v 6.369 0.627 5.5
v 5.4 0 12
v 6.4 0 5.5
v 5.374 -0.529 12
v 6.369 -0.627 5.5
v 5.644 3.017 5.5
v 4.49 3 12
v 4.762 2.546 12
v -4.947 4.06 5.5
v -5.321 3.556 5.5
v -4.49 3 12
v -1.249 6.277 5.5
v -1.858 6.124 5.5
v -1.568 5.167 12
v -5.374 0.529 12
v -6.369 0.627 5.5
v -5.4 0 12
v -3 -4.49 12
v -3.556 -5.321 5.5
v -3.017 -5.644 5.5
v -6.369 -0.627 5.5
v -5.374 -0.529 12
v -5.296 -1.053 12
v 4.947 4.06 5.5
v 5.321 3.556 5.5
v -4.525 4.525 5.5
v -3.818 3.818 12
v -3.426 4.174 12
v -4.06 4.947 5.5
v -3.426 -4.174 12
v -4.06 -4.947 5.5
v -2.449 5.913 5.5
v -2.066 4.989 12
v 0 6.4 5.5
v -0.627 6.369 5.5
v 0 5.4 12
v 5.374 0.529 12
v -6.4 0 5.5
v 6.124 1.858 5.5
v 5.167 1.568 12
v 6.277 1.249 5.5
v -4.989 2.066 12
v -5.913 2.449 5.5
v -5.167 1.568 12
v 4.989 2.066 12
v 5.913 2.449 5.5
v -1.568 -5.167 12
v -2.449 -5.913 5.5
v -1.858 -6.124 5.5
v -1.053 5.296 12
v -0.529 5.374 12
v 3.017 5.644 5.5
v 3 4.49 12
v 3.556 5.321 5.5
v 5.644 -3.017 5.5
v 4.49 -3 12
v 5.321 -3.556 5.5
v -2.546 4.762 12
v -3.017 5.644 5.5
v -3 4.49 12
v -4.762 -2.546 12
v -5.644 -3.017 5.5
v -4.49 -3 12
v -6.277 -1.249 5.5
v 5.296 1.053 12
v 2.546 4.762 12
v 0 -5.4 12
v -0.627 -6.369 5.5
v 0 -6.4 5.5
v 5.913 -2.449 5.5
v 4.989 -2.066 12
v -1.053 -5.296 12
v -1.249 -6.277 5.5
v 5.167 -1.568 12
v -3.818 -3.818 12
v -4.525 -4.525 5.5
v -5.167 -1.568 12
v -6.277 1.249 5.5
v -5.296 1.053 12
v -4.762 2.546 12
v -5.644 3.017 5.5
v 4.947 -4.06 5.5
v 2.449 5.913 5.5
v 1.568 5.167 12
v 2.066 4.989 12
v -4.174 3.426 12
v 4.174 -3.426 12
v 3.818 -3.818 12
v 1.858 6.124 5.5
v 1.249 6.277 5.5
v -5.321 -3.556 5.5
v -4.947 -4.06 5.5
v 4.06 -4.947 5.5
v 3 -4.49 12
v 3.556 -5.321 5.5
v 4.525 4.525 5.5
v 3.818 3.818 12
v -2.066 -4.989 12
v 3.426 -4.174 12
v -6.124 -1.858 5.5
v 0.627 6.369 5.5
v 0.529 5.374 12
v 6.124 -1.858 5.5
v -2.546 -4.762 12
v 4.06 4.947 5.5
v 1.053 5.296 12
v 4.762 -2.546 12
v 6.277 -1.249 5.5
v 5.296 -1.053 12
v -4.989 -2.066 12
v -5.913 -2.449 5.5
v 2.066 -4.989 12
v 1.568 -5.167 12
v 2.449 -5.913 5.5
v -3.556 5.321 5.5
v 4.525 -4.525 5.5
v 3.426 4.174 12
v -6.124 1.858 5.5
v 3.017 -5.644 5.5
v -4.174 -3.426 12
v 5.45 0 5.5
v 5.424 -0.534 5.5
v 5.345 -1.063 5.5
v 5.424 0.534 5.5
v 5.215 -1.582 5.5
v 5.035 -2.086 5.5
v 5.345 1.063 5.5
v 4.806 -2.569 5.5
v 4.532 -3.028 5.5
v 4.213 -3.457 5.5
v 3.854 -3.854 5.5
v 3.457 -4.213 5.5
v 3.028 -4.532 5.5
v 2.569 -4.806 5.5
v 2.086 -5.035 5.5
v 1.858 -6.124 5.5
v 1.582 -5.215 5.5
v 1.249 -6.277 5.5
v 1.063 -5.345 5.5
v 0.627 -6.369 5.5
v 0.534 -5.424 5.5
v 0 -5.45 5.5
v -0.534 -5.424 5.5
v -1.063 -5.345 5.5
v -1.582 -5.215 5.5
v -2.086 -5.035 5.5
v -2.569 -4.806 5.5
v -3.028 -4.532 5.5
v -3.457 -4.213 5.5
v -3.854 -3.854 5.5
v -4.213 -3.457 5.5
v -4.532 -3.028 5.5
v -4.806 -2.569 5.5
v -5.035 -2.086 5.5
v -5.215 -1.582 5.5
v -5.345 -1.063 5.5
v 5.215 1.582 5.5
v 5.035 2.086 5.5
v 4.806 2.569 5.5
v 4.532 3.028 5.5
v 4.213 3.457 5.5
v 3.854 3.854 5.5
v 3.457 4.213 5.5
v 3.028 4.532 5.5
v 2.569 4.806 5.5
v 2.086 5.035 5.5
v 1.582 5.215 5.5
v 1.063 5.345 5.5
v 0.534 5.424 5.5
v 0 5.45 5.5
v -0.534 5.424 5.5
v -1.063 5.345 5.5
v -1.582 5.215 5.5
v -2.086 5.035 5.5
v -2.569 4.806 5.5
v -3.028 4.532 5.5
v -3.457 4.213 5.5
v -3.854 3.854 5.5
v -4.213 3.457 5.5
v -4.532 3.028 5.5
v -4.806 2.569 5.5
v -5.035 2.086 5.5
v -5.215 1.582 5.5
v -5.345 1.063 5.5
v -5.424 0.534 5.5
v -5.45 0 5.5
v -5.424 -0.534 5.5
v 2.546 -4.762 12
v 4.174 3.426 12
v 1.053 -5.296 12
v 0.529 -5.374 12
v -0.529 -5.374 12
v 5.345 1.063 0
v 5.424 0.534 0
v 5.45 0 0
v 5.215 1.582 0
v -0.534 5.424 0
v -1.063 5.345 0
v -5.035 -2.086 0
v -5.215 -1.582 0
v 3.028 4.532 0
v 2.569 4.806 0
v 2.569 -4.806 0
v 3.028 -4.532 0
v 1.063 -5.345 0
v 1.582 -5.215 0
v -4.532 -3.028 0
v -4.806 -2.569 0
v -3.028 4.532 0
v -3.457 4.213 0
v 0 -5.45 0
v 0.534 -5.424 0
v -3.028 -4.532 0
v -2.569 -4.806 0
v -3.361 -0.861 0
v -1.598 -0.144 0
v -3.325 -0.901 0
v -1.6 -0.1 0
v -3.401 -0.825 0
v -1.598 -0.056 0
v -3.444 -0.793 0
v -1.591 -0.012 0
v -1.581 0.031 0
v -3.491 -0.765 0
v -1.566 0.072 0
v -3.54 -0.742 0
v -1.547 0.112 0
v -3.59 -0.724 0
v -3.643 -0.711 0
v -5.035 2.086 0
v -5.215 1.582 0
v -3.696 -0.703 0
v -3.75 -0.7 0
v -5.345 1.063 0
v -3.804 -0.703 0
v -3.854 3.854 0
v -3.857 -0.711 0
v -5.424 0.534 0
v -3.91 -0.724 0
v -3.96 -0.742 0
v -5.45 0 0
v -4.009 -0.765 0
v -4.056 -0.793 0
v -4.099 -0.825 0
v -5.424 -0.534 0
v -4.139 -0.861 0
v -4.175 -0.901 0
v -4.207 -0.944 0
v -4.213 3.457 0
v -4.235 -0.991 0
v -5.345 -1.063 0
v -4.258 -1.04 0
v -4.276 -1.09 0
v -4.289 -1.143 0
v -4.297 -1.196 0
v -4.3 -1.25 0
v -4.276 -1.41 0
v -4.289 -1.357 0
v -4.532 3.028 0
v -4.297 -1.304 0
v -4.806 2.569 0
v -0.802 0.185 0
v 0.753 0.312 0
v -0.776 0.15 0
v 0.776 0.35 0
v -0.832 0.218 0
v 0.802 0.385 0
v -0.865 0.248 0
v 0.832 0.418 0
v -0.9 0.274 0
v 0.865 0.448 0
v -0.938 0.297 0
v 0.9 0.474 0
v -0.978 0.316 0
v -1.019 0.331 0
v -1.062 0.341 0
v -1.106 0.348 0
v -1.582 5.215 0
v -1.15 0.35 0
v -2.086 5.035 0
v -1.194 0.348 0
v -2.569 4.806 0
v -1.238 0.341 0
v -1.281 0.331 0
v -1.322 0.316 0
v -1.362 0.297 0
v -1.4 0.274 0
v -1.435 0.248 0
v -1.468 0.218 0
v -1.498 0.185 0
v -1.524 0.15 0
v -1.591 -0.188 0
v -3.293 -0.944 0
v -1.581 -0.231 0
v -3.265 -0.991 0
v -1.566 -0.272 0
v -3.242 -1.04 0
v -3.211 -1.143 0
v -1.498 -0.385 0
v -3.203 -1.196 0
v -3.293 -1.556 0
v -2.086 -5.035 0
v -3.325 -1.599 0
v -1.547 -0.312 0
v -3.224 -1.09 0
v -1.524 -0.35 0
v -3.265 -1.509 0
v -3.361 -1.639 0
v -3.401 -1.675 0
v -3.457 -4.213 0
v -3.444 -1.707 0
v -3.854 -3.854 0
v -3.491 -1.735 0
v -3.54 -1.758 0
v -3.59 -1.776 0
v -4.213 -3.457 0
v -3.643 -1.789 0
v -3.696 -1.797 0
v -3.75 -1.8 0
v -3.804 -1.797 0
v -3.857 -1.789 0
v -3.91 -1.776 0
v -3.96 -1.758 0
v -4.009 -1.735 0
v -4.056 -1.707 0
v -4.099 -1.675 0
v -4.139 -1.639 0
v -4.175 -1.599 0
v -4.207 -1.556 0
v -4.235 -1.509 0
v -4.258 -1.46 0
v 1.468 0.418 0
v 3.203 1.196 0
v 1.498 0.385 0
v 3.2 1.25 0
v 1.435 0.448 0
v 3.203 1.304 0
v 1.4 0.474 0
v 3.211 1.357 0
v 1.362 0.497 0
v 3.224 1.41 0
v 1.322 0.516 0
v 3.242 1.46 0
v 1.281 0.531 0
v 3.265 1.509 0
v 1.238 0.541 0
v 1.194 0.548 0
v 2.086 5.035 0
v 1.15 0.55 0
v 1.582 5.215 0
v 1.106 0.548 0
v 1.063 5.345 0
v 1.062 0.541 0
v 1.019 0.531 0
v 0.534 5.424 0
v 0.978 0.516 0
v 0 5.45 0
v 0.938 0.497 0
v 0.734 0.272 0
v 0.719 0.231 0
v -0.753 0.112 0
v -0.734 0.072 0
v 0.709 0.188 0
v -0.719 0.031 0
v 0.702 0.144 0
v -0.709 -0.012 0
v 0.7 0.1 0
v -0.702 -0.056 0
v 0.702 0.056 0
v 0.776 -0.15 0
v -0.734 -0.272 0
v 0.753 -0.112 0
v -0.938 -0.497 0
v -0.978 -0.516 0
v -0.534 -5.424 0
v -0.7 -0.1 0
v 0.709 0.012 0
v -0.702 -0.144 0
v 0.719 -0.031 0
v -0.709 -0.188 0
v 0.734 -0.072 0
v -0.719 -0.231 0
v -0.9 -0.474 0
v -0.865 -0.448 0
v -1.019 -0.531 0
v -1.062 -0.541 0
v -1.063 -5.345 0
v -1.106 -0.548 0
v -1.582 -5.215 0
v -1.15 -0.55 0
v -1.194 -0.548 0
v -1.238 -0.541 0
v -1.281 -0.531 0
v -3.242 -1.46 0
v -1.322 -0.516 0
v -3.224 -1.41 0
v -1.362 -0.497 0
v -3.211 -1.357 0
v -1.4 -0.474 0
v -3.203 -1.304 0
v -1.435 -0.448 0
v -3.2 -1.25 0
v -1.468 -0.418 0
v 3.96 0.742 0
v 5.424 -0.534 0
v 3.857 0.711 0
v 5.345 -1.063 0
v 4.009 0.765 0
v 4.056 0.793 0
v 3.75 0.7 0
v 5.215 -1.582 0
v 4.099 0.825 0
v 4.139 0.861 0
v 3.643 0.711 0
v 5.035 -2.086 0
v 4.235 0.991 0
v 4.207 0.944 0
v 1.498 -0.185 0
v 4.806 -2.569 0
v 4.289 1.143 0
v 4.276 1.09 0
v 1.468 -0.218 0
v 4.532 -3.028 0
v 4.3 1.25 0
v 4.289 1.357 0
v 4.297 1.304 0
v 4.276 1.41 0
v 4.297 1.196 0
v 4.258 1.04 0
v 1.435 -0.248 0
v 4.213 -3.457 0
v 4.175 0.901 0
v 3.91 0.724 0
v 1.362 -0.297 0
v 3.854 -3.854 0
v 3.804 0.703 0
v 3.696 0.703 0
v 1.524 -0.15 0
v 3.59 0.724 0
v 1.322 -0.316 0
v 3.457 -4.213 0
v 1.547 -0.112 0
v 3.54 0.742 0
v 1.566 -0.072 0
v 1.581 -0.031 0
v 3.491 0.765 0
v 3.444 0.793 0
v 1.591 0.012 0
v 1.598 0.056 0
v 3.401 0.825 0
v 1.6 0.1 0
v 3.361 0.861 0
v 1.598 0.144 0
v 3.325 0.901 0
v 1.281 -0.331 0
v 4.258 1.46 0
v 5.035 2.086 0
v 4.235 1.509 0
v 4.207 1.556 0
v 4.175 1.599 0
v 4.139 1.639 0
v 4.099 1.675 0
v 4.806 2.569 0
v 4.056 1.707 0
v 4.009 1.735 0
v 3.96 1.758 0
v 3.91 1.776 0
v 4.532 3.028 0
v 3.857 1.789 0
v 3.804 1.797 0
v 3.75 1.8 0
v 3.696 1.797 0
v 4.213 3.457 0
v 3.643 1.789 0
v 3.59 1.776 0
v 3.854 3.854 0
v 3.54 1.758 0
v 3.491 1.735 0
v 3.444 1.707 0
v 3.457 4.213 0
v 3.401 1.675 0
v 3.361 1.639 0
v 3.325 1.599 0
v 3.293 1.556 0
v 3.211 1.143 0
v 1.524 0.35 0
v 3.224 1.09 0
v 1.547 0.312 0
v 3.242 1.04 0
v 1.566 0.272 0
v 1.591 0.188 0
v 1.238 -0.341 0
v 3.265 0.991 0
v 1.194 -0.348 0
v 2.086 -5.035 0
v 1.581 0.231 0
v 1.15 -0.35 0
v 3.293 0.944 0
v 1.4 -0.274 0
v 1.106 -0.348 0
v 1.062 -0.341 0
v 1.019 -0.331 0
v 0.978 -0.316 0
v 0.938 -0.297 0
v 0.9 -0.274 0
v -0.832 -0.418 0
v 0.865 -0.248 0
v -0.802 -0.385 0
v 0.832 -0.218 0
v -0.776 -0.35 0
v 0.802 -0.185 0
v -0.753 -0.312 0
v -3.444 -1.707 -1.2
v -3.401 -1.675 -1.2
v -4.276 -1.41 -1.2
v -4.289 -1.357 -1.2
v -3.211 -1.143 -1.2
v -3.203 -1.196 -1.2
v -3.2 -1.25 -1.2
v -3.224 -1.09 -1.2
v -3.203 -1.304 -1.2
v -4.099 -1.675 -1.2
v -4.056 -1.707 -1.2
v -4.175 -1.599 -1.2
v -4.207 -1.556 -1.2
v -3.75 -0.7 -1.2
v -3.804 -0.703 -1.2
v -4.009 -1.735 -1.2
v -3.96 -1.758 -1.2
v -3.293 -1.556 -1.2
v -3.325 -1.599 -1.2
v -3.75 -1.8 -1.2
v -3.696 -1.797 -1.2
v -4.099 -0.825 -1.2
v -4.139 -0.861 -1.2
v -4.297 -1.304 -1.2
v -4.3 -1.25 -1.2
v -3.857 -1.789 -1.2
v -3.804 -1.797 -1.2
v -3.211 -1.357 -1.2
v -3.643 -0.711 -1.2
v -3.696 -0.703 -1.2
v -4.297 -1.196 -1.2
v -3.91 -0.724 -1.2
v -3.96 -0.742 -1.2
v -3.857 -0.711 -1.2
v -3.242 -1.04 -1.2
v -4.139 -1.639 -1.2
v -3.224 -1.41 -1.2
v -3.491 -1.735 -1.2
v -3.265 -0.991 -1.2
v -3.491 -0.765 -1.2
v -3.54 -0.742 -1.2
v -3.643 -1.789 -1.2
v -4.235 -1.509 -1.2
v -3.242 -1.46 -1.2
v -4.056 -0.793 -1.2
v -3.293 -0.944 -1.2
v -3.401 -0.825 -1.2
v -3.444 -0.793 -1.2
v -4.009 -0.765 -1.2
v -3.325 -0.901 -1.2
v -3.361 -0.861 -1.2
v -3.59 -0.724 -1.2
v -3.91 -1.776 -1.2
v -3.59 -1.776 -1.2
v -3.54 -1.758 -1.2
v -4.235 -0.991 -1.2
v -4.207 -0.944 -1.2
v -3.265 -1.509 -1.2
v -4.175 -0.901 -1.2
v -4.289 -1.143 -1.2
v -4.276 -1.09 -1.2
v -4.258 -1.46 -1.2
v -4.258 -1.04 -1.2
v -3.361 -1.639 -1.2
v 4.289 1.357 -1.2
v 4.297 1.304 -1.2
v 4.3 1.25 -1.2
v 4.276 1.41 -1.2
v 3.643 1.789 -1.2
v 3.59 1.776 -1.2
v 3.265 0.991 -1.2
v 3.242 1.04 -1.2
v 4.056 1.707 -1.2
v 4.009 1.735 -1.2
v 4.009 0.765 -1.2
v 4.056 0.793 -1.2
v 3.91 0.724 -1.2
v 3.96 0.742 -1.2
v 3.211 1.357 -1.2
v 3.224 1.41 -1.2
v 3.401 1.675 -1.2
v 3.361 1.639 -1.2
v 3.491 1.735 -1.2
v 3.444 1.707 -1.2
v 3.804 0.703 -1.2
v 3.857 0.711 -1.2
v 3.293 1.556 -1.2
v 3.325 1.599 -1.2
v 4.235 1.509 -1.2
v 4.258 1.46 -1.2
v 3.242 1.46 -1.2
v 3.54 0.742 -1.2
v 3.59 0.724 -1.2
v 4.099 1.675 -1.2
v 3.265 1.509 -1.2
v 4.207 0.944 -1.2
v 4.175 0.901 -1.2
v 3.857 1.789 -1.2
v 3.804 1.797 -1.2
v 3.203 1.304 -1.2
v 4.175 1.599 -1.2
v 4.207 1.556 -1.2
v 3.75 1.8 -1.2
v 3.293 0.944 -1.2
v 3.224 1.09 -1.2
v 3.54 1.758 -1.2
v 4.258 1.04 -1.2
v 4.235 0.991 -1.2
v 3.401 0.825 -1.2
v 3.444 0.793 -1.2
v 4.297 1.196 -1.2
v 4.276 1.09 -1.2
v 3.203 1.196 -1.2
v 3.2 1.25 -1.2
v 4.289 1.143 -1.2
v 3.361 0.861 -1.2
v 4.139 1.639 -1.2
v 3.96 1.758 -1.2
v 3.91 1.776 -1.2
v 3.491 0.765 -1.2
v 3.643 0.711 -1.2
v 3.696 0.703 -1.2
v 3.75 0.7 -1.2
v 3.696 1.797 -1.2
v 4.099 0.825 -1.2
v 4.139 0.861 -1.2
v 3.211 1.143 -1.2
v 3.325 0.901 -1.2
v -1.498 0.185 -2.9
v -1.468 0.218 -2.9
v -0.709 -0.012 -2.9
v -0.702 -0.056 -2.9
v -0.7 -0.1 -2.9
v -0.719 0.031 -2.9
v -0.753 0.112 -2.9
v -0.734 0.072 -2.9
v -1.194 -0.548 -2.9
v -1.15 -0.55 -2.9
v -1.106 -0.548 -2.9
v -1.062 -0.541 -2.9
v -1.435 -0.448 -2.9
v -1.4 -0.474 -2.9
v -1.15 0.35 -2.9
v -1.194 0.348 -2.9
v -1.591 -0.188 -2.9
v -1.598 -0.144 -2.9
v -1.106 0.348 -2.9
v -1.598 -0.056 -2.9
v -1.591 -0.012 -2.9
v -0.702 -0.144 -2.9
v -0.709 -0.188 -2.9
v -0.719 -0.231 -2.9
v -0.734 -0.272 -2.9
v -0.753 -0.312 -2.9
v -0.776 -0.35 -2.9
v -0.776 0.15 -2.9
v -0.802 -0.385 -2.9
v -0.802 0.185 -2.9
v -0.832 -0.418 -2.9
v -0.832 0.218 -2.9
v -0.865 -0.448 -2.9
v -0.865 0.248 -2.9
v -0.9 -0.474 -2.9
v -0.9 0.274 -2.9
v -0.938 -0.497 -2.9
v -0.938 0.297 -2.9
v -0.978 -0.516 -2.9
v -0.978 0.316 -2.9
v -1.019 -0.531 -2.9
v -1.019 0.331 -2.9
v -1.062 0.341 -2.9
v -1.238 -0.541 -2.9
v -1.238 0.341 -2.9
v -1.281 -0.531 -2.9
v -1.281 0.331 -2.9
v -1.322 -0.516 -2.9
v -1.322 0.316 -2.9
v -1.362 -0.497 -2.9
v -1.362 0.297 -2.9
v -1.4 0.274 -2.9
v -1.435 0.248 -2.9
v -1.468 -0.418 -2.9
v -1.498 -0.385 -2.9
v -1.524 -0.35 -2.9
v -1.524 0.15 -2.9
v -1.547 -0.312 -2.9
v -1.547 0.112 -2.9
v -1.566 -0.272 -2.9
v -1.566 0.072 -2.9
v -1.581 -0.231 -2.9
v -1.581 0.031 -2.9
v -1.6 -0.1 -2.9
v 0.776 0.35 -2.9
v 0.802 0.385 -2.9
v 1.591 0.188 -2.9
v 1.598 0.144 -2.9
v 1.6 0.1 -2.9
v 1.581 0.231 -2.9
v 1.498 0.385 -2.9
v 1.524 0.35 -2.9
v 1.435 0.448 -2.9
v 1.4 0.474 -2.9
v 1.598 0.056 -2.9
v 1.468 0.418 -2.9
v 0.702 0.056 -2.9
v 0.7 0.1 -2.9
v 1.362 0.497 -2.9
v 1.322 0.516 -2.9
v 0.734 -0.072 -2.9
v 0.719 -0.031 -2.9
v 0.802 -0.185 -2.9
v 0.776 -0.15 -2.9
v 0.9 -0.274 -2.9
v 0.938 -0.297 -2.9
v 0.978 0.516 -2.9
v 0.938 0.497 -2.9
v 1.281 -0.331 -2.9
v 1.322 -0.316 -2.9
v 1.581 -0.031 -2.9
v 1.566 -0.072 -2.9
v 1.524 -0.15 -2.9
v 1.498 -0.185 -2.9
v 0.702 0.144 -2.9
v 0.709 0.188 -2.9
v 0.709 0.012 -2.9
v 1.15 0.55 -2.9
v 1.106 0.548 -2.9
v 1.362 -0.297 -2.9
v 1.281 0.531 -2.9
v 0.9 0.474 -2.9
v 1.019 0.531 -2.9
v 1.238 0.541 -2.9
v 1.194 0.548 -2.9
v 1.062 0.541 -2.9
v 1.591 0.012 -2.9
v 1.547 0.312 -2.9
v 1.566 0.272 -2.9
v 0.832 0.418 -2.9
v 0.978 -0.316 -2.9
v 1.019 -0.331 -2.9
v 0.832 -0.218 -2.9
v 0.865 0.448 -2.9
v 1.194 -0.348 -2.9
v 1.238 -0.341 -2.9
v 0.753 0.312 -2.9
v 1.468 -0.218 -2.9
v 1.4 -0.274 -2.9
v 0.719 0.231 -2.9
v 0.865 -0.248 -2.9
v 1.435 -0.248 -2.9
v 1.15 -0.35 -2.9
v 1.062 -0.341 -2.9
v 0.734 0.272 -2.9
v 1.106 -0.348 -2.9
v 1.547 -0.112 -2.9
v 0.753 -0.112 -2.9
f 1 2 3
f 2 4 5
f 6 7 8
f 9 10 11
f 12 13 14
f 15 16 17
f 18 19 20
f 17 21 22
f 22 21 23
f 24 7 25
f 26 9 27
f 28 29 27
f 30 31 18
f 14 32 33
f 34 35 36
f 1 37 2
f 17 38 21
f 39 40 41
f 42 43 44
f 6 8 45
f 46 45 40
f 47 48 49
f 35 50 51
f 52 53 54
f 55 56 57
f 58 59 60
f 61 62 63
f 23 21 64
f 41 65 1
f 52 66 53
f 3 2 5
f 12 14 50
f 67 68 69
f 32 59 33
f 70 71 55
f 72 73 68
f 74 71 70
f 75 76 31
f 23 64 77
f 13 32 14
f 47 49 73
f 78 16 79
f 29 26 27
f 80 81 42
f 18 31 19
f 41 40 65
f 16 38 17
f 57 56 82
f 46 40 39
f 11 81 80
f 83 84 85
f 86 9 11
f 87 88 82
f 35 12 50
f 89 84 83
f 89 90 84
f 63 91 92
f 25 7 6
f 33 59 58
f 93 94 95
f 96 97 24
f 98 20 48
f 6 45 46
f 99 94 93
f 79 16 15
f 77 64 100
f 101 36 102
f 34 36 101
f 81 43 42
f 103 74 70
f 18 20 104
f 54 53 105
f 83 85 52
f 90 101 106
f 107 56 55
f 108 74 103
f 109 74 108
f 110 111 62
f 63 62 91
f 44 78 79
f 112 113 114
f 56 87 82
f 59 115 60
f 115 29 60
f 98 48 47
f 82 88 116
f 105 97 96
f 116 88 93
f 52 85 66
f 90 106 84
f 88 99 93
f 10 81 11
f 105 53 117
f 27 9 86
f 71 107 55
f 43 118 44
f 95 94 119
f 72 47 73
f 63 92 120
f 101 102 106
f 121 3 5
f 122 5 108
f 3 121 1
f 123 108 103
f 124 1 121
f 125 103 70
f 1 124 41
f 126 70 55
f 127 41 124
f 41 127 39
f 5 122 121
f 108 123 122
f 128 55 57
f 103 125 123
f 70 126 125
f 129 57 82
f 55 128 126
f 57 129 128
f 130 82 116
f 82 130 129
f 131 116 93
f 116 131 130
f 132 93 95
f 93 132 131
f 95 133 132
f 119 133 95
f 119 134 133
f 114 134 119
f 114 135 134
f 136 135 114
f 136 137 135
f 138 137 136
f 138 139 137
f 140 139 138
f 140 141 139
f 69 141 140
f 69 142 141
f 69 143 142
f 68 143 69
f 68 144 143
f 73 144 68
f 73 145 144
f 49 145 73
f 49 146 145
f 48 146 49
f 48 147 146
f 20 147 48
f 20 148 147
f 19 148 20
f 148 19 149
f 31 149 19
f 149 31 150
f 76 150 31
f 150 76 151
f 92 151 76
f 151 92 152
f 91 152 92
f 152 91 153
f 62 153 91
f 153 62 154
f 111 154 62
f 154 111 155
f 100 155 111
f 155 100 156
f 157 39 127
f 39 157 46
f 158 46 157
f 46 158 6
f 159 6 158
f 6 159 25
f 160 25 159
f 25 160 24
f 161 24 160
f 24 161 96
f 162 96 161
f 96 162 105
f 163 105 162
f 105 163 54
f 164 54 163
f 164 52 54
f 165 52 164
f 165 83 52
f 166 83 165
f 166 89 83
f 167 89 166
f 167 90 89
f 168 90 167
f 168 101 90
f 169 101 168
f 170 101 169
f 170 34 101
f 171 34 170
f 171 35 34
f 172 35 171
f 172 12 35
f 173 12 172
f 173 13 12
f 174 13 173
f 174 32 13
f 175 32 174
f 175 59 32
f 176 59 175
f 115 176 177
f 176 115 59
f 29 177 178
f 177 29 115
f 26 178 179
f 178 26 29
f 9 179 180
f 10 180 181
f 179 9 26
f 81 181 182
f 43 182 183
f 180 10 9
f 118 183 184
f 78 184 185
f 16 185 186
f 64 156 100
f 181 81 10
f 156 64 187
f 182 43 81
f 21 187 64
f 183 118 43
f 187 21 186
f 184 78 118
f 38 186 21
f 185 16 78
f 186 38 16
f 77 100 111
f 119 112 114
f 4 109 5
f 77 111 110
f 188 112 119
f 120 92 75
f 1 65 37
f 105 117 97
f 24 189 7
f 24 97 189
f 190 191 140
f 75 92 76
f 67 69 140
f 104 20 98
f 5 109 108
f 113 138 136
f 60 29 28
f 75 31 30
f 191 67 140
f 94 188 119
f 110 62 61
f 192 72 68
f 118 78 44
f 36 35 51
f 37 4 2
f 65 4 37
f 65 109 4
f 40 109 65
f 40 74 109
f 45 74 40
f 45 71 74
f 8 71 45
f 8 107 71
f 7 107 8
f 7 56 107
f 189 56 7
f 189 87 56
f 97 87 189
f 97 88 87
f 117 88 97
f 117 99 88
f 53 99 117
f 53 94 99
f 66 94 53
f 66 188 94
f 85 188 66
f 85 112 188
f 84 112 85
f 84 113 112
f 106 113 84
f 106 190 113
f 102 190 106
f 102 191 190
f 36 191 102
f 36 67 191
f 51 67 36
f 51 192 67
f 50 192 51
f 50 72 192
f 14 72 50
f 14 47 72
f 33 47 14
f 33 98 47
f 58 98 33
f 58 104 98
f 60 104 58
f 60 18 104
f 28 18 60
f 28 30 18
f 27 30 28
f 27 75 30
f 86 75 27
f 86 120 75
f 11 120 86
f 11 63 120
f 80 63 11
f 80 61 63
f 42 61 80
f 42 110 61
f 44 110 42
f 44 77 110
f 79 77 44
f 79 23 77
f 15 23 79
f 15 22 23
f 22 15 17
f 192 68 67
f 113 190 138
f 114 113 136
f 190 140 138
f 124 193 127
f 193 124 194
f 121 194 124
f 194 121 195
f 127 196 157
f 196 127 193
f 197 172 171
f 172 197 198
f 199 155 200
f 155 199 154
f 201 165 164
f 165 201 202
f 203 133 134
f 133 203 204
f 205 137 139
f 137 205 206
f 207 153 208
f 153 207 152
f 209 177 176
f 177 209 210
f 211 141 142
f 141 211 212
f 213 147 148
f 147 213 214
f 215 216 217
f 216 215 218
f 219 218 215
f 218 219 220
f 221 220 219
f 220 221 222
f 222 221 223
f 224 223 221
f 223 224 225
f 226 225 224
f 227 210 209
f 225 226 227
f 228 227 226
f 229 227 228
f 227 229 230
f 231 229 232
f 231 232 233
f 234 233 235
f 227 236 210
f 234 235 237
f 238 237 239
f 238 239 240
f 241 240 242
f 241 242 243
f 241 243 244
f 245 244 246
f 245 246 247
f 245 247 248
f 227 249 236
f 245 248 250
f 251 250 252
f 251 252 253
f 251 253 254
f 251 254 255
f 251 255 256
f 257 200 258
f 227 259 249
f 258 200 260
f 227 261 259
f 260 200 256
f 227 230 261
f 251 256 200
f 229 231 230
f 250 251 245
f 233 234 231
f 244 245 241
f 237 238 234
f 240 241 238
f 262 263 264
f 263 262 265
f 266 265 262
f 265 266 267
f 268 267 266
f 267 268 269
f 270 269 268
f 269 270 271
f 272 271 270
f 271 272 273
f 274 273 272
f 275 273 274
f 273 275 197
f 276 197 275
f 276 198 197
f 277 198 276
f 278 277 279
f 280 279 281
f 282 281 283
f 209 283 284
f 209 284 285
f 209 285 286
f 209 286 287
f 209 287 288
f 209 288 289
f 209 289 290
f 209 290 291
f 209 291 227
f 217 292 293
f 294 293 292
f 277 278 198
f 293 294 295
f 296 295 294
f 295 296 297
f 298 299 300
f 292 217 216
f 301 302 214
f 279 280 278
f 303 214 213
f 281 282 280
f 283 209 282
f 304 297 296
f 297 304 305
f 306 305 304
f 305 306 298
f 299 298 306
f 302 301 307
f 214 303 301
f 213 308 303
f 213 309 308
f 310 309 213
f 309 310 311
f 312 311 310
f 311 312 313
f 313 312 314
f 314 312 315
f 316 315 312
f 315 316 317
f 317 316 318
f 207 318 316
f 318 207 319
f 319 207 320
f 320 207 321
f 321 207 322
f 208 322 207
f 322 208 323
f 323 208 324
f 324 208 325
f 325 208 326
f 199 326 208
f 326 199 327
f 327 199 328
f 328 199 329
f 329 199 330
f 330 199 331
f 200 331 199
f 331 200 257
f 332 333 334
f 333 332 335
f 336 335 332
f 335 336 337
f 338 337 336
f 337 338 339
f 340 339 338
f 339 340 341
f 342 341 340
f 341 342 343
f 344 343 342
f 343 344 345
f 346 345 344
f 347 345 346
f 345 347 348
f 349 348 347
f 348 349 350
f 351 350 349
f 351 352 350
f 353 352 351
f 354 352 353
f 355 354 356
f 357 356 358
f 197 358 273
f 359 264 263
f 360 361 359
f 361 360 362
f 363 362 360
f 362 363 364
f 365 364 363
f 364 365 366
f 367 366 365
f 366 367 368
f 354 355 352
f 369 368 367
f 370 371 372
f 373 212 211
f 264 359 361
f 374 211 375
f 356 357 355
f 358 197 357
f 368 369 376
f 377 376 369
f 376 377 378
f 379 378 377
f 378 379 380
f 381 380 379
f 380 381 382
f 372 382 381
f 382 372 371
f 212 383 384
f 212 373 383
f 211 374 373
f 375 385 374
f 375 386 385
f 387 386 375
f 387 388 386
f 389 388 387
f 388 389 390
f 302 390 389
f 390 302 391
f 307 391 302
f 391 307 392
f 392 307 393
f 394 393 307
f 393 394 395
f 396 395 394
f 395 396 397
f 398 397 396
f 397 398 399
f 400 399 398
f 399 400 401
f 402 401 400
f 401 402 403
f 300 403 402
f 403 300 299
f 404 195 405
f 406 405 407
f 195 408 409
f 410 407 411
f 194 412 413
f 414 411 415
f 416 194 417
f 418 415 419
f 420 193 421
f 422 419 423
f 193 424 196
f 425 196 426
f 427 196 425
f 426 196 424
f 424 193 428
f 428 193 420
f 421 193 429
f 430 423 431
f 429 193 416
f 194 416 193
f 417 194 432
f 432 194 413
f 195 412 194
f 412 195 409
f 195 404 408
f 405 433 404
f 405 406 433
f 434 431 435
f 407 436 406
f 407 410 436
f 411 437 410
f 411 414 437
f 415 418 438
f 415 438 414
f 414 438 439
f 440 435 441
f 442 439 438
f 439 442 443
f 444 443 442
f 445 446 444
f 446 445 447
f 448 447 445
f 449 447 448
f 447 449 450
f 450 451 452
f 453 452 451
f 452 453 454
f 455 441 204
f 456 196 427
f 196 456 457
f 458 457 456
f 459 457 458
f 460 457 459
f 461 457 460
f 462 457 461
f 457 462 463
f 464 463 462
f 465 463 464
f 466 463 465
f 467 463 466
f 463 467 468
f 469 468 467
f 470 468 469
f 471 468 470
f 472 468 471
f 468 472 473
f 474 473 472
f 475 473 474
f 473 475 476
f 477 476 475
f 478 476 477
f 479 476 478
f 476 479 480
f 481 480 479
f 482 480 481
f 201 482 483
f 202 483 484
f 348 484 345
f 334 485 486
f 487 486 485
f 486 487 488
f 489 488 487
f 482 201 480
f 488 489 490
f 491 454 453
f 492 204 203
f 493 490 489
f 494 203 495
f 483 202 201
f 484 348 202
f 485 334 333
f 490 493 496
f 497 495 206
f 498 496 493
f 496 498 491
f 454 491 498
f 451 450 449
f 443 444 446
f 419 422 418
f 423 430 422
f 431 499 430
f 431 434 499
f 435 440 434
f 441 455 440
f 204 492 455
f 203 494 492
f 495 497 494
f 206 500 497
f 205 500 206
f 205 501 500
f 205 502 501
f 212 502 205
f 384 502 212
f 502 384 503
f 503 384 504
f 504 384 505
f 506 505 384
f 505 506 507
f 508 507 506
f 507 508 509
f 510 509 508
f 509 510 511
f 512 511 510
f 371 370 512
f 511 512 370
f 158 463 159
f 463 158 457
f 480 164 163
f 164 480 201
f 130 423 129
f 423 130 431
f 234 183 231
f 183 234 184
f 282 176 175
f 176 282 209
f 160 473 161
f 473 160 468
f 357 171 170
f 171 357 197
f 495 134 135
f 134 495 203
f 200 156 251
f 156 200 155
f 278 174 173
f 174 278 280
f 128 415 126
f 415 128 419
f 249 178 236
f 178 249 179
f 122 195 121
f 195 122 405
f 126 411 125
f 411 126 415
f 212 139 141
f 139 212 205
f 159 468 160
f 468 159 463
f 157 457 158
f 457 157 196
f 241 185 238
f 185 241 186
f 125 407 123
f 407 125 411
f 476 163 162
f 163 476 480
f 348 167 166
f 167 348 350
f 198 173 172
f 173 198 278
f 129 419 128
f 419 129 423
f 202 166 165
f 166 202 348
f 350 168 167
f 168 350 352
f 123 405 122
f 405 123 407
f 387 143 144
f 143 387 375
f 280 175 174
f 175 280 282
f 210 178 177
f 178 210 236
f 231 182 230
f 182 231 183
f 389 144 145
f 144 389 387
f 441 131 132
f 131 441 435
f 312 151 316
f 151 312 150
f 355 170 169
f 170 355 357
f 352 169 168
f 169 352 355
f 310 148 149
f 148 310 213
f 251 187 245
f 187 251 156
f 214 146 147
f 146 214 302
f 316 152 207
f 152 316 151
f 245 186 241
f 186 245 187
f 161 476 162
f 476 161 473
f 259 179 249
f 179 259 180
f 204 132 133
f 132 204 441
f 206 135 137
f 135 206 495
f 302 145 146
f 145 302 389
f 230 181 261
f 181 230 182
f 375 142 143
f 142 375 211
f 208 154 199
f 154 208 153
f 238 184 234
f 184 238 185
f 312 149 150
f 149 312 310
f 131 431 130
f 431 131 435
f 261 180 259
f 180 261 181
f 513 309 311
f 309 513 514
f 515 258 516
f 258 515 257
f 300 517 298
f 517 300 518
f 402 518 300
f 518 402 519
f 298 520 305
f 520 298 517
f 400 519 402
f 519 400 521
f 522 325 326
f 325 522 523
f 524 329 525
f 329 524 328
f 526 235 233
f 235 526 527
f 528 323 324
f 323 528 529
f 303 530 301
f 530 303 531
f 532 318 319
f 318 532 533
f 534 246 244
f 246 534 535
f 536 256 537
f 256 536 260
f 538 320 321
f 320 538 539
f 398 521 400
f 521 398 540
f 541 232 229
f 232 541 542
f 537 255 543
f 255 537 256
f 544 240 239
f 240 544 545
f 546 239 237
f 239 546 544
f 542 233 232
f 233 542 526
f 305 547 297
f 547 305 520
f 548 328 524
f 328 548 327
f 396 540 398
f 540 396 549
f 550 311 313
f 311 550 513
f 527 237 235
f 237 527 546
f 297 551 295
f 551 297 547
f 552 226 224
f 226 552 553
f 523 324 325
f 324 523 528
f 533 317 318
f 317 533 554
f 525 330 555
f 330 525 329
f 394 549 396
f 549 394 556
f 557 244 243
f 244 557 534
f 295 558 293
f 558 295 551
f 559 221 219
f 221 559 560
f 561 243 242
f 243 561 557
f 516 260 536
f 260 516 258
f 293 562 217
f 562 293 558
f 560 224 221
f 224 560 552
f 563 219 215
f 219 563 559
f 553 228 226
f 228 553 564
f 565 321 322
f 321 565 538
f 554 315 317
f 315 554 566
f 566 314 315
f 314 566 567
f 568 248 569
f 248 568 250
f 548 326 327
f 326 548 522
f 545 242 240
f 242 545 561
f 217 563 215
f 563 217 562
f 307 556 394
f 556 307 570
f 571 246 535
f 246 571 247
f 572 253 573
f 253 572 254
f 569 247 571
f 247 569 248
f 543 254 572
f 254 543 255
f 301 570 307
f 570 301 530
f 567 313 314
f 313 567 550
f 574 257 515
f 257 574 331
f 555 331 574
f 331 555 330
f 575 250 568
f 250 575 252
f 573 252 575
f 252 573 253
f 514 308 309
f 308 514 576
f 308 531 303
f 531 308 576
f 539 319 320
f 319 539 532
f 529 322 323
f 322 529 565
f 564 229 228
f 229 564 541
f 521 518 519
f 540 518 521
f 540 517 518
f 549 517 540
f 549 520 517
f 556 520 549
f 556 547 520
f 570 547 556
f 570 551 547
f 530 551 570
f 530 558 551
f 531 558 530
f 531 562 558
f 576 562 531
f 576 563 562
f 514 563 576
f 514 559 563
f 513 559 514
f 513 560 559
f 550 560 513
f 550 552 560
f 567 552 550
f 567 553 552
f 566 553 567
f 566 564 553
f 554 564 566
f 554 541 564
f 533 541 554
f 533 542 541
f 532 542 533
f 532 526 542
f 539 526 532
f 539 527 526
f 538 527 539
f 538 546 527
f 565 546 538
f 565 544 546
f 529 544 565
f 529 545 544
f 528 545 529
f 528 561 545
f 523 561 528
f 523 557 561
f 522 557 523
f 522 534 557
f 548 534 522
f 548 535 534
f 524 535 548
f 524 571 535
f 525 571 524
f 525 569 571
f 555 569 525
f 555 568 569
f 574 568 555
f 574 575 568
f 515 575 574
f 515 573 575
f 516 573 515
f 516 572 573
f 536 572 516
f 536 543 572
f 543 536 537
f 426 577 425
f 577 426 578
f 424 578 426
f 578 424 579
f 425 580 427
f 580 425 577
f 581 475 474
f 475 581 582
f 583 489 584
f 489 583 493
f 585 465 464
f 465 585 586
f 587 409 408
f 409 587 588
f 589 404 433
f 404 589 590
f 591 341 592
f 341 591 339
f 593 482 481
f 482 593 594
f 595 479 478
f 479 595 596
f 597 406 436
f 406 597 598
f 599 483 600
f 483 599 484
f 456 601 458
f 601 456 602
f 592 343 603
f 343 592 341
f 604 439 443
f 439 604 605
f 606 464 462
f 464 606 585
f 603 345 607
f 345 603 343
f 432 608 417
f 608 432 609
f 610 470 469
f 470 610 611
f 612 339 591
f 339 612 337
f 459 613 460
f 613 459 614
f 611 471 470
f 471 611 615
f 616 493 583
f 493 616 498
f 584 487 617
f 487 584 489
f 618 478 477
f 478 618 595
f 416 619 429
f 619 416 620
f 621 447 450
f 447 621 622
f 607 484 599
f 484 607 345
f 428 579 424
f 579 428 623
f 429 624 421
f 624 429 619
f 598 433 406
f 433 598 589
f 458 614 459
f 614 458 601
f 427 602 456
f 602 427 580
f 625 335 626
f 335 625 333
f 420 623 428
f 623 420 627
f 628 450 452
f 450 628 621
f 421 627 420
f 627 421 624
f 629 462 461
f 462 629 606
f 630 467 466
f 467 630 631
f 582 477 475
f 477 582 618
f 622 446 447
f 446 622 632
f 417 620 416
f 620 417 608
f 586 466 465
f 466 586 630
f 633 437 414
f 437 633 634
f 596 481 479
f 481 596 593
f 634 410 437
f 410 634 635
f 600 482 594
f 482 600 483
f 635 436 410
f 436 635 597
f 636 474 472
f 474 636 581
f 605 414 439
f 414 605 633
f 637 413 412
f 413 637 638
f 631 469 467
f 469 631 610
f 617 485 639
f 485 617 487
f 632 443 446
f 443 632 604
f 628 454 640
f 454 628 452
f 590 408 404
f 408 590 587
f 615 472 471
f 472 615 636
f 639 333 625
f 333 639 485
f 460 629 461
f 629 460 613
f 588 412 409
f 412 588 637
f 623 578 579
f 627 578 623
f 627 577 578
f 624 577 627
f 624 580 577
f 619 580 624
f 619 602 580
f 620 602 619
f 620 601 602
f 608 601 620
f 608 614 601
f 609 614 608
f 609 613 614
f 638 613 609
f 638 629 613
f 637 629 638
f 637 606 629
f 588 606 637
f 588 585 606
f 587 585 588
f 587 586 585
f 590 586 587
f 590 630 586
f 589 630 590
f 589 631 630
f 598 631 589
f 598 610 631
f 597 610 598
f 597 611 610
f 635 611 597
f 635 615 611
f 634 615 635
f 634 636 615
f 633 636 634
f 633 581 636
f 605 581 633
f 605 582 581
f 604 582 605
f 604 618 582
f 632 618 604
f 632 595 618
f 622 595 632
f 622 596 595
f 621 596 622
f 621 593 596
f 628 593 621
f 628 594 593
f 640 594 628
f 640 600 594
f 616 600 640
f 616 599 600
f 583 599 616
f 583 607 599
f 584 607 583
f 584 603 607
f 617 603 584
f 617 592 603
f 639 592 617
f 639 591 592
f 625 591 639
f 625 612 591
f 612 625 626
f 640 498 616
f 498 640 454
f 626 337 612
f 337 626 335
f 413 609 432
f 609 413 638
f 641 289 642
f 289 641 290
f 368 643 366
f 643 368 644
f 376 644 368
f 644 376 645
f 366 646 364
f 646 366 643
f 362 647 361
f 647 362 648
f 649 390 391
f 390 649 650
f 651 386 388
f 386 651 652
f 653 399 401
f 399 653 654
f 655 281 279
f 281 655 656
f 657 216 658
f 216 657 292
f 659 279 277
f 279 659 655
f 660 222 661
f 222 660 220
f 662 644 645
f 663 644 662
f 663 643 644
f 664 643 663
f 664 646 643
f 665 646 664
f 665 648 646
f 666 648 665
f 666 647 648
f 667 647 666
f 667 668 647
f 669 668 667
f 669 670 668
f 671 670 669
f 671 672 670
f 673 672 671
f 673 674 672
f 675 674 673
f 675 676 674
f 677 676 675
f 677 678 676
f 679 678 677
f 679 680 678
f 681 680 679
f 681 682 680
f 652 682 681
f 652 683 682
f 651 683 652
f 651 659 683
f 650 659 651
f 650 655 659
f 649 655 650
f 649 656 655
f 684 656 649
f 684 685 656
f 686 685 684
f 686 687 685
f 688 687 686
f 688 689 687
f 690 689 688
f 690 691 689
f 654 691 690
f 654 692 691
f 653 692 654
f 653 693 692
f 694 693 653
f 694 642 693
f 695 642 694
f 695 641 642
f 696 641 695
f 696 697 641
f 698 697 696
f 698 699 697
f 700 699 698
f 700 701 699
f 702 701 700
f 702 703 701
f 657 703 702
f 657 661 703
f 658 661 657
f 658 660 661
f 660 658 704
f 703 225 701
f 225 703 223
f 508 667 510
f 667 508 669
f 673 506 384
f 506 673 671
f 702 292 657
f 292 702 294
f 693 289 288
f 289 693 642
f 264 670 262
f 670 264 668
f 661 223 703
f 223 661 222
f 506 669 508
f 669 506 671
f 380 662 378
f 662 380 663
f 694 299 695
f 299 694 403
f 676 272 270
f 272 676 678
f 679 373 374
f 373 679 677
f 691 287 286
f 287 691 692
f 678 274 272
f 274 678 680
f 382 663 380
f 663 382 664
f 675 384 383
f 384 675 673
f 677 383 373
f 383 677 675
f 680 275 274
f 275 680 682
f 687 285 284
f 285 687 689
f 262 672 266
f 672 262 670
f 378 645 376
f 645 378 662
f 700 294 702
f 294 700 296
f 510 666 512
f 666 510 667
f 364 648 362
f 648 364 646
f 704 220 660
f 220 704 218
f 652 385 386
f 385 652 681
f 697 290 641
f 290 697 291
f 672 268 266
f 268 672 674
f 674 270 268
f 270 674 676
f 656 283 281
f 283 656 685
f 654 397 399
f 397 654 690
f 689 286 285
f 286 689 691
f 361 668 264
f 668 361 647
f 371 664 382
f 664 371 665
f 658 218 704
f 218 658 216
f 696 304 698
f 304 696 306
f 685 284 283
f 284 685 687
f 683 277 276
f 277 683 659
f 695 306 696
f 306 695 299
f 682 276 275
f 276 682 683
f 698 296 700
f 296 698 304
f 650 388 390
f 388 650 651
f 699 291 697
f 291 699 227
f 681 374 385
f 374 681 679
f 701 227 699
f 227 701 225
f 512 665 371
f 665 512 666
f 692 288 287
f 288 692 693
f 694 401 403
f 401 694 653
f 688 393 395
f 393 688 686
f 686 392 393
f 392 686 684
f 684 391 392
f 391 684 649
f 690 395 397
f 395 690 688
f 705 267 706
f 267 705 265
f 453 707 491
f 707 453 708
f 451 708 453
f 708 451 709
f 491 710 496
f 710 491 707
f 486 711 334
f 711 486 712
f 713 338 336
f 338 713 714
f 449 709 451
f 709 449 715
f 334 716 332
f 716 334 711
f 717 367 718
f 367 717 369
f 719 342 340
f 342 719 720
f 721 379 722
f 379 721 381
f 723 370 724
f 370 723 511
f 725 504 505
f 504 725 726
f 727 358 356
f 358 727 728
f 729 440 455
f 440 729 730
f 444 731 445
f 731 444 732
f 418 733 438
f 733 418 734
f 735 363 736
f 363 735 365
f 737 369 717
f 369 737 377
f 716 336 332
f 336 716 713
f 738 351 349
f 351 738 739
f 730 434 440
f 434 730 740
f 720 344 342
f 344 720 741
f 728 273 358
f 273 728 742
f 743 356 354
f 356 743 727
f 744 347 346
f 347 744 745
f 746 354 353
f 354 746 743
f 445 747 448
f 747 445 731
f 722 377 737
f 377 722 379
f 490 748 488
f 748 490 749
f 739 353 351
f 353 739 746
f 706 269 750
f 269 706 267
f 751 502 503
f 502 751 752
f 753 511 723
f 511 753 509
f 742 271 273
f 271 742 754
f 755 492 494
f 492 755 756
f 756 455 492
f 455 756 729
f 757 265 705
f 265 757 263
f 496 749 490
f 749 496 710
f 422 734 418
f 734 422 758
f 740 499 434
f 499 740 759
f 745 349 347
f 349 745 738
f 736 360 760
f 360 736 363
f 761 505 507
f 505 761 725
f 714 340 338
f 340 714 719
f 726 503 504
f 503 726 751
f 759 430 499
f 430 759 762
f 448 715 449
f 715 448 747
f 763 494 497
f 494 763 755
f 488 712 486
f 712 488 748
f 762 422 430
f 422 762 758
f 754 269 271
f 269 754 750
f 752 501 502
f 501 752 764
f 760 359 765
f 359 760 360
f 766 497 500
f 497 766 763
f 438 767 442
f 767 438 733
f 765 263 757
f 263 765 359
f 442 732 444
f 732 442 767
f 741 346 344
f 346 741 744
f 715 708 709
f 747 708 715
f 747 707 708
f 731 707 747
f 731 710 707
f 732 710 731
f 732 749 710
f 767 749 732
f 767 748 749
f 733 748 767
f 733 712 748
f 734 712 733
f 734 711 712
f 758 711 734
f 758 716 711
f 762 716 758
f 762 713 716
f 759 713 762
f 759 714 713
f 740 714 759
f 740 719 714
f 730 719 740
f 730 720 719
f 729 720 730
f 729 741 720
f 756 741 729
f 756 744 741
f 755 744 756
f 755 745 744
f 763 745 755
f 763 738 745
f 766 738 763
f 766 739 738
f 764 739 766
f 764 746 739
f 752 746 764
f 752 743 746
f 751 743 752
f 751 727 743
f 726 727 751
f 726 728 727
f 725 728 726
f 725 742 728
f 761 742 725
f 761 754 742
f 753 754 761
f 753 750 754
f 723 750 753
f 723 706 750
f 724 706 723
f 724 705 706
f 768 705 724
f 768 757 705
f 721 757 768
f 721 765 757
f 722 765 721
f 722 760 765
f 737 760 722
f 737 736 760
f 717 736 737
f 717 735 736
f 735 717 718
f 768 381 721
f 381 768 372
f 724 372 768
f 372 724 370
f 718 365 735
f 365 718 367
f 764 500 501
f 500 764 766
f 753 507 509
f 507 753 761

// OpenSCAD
//
// CK K12C sealed rubber button
//

$fn=64;

module button() {
     color("black") {
	  translate( [0, 0, 5.5])
	       cylinder( r1=6.4, r2=5.4, h=6.5);
	  cylinder( h=5.5, r=10.9/2);
     }
     translate( [-7.5/2, -2.5/2, -1.2])     cylinder( r=1.1/2, h=1.2);
     translate( [7.5/2, 2.5/2, -1.2])    cylinder( r=1.1/2, h=1.2);
     translate( [-2.3/2, -0.1, -2.9])   cylinder( h=2.9, r=0.9/2);
     translate( [2.3/2, 0.1, -2.9])   cylinder( h=2.9, r=0.9/2);
}

button();
